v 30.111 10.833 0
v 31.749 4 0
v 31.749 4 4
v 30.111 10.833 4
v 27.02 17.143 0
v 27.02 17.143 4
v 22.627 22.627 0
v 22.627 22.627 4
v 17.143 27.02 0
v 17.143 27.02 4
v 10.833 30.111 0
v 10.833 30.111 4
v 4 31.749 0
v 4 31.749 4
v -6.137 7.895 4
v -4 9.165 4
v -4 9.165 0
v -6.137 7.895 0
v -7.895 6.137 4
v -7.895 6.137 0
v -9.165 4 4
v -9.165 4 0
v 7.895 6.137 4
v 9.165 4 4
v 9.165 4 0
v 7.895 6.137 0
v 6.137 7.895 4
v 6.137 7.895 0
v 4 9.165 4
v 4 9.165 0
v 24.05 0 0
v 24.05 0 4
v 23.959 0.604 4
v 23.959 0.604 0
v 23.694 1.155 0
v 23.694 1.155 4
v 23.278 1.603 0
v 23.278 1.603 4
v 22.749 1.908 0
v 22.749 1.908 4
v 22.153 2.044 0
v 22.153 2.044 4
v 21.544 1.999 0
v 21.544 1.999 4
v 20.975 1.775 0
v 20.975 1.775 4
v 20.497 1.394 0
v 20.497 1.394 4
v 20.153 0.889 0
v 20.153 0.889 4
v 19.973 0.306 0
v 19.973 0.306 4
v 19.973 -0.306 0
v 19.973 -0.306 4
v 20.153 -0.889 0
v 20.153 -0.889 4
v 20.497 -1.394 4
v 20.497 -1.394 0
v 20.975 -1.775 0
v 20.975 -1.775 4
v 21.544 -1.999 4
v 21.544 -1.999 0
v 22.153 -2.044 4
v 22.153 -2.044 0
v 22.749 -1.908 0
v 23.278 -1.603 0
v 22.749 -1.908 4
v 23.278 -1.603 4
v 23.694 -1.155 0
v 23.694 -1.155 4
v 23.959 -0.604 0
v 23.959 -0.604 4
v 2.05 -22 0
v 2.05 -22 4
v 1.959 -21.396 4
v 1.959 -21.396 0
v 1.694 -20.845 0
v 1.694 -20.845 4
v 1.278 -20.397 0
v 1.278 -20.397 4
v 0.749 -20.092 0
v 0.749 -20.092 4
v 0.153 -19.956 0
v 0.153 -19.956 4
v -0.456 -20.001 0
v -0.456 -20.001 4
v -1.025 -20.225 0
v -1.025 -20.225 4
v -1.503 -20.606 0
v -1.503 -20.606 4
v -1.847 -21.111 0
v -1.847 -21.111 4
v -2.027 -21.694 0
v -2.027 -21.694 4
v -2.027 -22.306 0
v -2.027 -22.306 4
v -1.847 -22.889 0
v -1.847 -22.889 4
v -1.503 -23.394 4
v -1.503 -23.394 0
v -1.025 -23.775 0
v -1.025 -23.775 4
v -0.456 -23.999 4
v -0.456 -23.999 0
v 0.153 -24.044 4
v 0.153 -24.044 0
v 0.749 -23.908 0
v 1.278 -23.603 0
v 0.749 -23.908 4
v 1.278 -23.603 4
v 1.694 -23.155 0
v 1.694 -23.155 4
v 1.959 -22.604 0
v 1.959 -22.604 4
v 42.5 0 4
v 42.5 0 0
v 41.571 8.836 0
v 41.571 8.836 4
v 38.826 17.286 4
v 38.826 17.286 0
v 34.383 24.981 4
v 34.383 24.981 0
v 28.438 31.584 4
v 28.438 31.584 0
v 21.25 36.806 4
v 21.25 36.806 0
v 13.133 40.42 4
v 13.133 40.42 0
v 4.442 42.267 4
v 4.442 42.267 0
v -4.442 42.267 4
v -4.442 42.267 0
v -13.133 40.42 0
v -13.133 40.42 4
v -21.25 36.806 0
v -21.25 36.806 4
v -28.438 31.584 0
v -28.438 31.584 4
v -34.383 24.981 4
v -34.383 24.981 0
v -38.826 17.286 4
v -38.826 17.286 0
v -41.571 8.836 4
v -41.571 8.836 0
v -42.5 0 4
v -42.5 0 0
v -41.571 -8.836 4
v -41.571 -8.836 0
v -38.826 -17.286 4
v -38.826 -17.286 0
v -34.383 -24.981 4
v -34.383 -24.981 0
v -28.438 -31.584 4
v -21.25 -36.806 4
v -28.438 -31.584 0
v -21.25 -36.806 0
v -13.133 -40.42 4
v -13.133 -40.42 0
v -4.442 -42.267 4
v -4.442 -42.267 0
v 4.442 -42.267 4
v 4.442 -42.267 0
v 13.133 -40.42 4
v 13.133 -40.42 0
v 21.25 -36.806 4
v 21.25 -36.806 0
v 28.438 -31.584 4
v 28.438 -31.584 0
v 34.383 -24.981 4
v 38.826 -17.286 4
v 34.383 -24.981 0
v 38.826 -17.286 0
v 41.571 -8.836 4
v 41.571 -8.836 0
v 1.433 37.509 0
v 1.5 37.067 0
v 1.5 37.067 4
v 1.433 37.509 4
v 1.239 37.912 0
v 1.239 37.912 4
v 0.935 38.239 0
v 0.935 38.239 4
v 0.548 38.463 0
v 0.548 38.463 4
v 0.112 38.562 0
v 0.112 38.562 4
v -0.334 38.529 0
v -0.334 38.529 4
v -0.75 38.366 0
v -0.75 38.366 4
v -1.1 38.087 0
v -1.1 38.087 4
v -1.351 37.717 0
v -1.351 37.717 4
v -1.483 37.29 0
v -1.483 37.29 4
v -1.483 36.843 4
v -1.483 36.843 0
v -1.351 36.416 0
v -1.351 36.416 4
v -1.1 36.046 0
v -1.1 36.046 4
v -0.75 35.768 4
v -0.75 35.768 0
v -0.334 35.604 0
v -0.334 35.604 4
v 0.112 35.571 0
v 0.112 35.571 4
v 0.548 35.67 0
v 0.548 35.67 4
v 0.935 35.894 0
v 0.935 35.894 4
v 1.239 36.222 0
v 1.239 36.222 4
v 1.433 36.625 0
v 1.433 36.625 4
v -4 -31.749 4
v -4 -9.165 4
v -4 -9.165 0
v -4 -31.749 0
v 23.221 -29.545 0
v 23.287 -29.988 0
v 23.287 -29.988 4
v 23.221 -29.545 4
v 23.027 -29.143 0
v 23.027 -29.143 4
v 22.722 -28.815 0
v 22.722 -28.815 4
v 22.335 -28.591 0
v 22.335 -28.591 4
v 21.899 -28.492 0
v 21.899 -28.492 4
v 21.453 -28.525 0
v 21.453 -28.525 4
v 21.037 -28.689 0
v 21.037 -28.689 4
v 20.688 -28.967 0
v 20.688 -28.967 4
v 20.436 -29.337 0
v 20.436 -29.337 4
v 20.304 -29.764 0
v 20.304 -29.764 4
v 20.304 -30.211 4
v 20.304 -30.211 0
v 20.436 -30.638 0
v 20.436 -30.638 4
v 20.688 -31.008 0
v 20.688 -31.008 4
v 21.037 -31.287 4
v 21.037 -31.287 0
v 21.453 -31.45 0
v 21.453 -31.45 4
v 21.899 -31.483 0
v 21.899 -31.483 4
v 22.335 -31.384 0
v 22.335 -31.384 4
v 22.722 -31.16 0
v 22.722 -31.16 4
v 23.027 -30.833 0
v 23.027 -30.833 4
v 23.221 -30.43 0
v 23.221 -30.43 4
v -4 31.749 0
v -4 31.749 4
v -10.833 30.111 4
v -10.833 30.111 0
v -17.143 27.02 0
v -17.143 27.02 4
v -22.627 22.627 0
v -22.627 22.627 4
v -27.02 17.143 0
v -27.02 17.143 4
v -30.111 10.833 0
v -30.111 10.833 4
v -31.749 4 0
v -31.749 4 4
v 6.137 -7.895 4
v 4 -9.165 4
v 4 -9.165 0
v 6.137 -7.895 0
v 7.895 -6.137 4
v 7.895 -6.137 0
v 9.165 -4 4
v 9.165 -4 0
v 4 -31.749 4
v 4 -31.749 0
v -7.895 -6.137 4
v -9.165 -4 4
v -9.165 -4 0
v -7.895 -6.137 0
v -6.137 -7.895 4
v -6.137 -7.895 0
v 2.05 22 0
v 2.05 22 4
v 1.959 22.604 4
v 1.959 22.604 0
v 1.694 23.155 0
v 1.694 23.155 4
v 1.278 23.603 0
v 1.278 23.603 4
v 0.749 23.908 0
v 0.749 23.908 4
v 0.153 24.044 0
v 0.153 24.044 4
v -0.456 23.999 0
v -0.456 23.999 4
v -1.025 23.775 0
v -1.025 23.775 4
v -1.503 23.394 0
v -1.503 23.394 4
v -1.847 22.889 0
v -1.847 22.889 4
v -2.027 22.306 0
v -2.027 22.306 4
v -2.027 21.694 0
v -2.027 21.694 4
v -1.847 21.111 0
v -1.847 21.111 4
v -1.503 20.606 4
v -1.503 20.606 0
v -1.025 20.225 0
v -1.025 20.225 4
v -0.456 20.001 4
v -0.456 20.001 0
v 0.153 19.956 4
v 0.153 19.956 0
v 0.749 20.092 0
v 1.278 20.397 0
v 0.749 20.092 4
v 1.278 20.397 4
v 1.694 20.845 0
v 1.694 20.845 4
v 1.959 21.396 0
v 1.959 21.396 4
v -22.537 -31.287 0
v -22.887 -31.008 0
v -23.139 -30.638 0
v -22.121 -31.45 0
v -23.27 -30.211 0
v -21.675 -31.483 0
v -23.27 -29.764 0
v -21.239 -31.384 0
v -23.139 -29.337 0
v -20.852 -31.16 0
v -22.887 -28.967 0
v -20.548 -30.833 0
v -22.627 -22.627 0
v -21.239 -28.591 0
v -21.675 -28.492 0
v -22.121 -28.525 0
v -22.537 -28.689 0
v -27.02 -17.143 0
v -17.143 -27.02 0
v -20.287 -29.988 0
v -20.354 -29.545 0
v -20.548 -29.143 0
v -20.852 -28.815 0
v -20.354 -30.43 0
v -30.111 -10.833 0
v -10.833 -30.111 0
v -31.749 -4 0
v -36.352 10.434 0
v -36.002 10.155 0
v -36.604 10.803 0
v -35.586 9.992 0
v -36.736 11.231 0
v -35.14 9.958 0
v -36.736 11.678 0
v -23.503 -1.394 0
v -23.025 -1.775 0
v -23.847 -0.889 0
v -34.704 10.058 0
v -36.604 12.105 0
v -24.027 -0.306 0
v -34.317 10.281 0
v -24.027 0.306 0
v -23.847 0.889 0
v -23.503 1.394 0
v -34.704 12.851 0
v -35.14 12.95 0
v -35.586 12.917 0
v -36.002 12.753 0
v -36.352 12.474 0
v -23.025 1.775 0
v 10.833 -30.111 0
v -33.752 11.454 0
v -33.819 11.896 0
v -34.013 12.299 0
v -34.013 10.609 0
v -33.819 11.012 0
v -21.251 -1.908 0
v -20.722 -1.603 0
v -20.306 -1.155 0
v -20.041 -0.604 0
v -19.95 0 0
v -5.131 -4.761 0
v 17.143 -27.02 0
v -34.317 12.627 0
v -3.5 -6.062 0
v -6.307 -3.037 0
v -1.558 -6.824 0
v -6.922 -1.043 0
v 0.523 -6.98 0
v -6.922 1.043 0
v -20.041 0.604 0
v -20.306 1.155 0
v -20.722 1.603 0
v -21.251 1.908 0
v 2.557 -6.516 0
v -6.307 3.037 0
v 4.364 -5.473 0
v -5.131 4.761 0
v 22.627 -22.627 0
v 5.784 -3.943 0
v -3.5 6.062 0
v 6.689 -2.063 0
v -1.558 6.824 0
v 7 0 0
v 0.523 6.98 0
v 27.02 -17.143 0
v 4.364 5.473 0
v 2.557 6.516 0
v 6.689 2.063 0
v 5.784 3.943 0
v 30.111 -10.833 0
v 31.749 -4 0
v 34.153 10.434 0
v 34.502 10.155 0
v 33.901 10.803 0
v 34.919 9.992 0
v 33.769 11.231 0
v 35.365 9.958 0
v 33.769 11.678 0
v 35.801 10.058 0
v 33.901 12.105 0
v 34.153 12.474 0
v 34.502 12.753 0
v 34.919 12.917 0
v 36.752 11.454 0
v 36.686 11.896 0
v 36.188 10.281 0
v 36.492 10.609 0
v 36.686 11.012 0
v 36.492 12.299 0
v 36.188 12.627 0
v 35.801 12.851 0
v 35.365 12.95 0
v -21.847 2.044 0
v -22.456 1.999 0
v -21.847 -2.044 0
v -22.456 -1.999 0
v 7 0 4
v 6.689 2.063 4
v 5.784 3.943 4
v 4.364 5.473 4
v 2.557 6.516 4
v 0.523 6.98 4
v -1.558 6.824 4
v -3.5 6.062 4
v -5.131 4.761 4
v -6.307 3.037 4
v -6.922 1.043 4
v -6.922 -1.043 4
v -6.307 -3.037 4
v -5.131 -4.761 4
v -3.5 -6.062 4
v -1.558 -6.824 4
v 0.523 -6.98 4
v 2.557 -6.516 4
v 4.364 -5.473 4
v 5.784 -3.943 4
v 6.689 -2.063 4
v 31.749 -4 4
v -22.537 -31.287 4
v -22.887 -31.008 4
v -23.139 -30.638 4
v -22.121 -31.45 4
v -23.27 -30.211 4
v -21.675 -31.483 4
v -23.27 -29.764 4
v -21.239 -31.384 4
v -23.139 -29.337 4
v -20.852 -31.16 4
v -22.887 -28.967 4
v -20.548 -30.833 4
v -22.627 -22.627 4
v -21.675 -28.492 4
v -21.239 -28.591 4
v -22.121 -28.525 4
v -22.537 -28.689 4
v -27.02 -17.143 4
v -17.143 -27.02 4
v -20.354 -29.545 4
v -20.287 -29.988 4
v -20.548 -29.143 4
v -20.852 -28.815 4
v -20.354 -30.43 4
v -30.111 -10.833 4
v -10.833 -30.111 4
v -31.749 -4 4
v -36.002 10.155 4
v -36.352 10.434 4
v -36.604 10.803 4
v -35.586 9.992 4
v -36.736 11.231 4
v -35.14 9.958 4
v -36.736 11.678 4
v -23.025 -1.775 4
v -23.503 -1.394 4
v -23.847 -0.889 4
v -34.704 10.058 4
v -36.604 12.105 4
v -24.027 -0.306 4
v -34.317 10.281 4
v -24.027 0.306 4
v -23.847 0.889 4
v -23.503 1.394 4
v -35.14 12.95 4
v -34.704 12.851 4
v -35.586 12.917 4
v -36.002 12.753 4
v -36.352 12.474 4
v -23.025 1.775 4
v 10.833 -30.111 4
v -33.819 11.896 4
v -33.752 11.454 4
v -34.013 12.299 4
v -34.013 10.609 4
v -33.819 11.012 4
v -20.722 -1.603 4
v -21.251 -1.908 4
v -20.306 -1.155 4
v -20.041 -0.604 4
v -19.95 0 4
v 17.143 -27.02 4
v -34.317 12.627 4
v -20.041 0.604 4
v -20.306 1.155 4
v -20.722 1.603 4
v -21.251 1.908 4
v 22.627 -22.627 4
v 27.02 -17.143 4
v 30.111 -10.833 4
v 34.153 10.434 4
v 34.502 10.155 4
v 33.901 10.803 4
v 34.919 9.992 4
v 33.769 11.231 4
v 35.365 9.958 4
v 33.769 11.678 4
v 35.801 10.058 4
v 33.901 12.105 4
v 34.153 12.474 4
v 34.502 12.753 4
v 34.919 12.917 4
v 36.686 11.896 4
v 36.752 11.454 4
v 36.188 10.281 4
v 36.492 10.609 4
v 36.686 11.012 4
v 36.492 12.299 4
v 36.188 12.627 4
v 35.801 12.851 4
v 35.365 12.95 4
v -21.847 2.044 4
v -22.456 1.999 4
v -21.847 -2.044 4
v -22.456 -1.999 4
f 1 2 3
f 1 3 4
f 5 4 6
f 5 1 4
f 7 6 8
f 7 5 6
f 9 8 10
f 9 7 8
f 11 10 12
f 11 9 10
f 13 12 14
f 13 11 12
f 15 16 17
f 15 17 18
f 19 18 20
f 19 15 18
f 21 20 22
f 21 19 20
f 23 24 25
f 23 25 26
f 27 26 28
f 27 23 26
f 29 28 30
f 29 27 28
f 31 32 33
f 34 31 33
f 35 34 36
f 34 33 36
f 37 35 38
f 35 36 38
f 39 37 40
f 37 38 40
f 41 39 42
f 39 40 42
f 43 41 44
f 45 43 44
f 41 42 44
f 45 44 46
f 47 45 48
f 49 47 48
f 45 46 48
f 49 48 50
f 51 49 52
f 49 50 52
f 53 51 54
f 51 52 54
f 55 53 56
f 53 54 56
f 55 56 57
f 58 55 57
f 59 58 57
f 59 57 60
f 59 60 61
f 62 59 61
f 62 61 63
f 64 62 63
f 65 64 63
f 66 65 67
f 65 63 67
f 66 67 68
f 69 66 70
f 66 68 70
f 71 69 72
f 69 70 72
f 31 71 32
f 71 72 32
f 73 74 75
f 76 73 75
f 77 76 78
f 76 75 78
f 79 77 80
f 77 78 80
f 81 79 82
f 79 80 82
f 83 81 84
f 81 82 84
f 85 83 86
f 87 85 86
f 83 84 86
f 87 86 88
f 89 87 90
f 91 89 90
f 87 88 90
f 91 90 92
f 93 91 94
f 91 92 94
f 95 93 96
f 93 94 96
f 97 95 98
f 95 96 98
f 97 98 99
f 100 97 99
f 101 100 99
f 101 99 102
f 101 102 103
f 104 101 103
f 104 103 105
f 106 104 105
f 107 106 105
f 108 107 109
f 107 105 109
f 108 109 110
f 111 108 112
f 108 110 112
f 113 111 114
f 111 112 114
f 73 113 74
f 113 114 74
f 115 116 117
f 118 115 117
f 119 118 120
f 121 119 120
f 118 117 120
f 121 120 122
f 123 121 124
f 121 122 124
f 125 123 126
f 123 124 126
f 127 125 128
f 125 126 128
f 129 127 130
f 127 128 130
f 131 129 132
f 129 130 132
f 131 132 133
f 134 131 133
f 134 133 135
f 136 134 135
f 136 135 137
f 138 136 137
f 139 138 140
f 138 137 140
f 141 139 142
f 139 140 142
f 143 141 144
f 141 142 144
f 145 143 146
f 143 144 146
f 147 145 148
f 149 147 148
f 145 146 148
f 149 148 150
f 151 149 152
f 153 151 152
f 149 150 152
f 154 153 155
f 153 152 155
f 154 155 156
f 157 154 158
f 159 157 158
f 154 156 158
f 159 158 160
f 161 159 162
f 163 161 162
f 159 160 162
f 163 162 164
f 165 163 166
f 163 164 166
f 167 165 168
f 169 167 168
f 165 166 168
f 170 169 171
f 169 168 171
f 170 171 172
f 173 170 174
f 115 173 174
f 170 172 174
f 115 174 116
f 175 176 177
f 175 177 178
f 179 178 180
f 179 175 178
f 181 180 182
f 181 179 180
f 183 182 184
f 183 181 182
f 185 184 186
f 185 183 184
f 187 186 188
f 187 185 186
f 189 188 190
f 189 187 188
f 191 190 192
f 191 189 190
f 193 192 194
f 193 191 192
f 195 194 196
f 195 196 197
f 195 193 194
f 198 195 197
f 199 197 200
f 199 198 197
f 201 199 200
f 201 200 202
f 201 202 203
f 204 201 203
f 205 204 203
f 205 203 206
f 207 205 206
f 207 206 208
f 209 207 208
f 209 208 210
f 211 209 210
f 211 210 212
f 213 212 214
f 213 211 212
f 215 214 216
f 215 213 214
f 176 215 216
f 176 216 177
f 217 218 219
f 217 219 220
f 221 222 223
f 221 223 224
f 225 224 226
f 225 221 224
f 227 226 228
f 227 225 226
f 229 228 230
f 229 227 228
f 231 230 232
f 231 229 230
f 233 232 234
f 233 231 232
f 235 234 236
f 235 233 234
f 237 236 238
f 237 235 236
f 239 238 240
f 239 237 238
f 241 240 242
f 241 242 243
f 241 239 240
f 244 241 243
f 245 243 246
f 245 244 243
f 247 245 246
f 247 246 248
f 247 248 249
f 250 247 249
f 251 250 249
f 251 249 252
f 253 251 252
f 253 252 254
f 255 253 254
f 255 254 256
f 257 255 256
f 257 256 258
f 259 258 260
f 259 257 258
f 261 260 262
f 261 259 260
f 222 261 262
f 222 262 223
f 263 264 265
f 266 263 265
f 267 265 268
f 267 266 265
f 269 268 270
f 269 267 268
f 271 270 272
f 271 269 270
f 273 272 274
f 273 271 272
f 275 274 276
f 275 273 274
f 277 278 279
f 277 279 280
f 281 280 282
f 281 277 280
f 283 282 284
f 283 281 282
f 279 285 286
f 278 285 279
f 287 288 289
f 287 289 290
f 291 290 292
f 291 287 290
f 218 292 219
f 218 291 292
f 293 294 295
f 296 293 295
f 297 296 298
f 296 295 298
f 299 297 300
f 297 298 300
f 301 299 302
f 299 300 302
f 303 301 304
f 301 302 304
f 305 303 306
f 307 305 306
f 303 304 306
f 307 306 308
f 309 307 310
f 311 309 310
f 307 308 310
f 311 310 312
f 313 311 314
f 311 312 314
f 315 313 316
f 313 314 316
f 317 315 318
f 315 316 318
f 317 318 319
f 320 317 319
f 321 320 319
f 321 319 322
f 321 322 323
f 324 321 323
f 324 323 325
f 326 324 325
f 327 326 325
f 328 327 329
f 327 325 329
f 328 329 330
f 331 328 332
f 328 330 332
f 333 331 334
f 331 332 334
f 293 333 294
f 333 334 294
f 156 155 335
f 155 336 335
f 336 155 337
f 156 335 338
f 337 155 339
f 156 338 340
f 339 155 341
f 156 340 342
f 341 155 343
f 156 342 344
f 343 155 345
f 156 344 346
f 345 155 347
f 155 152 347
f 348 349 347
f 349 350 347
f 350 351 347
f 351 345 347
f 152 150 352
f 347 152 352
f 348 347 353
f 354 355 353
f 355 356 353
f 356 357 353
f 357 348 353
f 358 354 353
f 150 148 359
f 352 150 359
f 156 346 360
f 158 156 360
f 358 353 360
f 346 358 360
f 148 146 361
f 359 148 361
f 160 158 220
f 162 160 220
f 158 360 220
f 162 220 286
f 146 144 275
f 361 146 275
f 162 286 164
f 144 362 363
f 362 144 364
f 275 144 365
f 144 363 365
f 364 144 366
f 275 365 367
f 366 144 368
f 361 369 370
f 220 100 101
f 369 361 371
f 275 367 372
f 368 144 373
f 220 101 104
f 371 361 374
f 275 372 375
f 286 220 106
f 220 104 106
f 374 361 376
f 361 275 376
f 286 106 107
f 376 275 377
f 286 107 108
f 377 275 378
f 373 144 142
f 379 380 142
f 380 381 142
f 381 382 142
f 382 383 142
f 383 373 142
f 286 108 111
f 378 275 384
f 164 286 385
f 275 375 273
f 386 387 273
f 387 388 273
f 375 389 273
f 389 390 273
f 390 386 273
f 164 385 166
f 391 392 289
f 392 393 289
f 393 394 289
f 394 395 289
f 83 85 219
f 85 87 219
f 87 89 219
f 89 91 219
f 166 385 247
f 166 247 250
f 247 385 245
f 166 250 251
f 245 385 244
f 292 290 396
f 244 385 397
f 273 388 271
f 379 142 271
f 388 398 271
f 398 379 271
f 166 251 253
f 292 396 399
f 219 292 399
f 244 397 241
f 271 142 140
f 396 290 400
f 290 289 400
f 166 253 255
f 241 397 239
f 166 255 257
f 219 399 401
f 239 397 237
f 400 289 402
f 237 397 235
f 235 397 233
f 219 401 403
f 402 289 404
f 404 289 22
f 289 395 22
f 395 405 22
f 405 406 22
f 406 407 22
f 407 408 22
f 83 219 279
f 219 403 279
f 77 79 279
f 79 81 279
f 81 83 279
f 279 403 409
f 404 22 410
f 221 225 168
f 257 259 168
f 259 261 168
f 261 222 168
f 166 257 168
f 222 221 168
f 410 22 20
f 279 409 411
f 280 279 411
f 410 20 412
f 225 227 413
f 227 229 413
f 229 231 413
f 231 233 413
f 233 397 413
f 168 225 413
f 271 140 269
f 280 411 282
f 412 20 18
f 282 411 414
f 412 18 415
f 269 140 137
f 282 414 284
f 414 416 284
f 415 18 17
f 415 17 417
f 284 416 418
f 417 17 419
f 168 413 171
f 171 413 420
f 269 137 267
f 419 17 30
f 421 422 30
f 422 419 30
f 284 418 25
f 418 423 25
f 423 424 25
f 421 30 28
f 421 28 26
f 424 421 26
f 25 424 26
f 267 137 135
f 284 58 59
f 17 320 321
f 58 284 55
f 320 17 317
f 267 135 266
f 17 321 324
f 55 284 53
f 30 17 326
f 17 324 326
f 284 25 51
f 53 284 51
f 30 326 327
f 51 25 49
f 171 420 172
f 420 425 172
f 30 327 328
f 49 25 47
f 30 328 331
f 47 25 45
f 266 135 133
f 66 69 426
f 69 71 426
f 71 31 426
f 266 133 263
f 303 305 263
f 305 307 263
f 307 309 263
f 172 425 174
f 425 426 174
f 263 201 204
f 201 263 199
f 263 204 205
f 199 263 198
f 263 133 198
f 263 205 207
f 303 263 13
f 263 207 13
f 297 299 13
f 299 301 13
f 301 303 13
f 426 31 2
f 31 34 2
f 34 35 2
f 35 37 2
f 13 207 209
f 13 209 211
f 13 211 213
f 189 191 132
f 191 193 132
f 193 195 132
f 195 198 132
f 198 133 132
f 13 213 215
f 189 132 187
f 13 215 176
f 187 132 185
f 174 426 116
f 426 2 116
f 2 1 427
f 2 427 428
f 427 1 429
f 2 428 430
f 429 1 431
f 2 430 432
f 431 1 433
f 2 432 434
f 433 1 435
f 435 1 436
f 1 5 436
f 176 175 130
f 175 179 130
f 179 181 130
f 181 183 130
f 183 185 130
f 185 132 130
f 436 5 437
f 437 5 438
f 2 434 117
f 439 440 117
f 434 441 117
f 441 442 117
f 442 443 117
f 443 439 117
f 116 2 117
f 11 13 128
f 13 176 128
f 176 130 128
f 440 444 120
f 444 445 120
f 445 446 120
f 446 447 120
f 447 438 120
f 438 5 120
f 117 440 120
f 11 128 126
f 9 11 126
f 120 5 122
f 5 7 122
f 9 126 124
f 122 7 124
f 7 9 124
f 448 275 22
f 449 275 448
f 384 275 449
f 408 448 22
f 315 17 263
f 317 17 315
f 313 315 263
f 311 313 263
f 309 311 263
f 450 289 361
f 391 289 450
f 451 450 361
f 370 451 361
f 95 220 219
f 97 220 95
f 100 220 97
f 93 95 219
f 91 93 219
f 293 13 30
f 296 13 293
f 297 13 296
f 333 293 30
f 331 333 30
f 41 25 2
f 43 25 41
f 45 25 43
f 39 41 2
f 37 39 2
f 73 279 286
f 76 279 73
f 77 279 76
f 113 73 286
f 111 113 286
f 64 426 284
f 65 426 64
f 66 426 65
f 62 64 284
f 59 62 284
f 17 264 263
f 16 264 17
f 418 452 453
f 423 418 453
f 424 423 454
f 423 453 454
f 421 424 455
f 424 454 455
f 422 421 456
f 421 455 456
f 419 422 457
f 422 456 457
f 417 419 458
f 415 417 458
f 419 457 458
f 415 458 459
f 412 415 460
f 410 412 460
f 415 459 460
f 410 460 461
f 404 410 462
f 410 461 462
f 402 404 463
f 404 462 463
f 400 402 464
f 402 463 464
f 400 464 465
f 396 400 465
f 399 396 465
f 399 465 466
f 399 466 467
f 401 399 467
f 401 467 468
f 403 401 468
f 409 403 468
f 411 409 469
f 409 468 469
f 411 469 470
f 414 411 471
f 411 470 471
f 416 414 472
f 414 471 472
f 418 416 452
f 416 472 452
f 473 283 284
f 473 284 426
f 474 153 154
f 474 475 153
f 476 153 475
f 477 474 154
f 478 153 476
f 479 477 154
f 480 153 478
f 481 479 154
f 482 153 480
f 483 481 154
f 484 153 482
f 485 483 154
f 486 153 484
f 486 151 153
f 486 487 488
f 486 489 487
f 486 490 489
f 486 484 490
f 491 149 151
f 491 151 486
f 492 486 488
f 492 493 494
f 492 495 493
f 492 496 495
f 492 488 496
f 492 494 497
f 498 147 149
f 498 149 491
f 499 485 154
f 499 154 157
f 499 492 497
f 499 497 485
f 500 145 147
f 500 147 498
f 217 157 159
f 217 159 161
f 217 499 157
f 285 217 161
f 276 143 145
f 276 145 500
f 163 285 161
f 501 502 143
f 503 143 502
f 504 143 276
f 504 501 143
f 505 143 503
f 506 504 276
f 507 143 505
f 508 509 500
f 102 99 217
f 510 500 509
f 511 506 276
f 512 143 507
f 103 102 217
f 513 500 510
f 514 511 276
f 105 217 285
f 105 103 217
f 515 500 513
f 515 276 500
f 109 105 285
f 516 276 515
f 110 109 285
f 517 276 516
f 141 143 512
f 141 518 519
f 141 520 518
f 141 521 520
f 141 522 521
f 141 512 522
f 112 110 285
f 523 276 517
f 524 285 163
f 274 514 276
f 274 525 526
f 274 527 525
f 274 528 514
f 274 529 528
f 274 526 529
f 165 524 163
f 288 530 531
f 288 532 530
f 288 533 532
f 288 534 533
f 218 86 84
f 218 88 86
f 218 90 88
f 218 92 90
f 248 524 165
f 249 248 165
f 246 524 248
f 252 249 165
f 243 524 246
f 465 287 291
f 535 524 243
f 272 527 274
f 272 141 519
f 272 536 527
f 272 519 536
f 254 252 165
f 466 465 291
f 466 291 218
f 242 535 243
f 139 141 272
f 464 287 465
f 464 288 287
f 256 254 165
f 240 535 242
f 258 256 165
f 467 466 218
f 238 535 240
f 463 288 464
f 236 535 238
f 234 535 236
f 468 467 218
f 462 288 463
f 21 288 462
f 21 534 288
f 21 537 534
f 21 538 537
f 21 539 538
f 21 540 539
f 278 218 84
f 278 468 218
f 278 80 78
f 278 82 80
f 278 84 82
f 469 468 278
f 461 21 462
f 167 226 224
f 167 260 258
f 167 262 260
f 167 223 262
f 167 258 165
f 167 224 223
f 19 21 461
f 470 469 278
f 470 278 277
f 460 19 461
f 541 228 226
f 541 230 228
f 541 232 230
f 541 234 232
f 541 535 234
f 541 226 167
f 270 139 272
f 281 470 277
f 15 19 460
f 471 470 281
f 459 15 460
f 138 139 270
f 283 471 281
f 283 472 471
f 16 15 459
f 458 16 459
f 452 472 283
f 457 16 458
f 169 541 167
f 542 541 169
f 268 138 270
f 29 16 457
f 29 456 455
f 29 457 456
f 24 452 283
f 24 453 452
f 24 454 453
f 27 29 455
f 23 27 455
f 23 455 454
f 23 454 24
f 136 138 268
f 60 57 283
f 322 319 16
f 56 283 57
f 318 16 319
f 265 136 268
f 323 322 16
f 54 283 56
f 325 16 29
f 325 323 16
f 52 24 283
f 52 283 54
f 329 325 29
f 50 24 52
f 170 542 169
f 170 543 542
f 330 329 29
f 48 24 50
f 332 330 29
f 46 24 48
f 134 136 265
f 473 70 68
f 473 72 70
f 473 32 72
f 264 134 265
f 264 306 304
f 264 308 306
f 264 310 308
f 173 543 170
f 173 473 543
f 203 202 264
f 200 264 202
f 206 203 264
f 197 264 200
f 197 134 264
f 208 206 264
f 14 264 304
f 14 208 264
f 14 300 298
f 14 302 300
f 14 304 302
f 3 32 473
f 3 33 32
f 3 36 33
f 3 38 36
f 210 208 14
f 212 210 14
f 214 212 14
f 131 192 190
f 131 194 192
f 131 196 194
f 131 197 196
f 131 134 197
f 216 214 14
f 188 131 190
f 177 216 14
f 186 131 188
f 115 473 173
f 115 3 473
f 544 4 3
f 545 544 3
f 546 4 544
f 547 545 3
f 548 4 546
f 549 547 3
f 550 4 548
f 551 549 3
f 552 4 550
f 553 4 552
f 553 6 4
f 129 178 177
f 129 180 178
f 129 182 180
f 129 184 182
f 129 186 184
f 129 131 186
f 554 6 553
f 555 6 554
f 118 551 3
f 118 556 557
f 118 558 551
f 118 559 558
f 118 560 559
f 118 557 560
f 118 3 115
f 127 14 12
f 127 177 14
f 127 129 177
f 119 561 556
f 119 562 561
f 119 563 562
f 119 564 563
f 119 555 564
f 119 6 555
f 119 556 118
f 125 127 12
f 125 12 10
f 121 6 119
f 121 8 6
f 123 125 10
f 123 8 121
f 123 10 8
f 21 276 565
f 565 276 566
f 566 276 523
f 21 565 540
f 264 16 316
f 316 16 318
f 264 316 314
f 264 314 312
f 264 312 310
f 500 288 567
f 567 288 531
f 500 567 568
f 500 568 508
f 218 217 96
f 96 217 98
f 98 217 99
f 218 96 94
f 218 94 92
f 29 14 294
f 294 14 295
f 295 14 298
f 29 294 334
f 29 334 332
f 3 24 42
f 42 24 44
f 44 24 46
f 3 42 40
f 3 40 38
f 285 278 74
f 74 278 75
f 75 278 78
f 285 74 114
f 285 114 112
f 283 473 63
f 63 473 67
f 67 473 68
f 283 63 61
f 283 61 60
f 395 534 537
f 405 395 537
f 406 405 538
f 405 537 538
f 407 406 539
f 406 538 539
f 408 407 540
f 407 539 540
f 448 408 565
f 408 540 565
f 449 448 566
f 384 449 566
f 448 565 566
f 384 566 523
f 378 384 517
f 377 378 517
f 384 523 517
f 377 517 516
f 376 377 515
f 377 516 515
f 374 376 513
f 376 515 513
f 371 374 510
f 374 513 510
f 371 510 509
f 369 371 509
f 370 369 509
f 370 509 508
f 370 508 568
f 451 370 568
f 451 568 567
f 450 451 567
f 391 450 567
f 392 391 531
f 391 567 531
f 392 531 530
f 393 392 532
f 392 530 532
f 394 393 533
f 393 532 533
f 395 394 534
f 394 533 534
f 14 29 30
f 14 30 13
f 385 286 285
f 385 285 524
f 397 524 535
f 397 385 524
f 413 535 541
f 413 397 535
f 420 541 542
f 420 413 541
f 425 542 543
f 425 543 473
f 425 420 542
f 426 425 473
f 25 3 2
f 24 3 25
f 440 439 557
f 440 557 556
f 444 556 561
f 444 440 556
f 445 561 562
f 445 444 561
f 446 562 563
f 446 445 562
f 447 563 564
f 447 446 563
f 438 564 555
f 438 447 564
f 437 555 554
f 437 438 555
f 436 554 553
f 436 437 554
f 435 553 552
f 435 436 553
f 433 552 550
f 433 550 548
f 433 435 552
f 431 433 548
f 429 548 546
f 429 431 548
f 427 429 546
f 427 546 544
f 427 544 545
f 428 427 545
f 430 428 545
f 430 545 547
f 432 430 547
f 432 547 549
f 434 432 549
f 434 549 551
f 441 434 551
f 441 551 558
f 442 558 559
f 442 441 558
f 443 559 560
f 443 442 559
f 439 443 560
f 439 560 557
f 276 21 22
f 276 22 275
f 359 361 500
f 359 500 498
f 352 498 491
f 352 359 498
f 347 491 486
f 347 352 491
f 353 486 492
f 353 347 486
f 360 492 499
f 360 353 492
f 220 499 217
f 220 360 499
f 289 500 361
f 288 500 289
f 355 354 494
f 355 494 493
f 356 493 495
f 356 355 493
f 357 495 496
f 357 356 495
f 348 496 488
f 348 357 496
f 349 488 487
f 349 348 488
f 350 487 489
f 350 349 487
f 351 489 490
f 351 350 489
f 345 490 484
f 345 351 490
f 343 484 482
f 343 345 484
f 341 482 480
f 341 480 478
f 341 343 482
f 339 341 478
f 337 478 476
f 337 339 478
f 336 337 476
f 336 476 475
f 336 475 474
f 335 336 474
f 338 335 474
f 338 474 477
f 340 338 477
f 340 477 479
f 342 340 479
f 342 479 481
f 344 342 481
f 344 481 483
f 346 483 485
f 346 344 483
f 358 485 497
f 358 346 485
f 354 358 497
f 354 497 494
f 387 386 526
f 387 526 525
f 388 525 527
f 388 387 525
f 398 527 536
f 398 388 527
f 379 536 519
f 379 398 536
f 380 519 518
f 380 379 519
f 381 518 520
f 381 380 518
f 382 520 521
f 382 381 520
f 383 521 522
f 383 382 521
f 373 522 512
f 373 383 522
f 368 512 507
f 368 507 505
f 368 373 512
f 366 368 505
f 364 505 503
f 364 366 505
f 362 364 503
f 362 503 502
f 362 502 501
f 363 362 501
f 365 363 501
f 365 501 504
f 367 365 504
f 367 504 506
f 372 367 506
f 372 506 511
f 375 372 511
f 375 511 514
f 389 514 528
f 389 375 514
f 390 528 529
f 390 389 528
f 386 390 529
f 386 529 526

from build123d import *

# Parameters (mm, degrees)
SKETCH1_R           = 42.5
SKETCH1_R_2         = 32
SKETCH1_R_3         = 1.5
BOSS_EXTRUDE1_DEPTH = 4
SKETCH2_R           = 2.05
SKETCH2_R_2         = 7
BOSS_EXTRUDE2_DEPTH = 4


with BuildPart() as part:
    # Sketch1 → Boss-Extrude1 (new body)
    with BuildSketch(Plane.XY):
        Circle(SKETCH1_R)
        Circle(SKETCH1_R_2, mode=Mode.SUBTRACT)
        with Locations((0, 37.066662977)):
            Circle(SKETCH1_R_3, mode=Mode.SUBTRACT)
        with Locations((35.252491362, 11.454228785)):
            Circle(SKETCH1_R_3, mode=Mode.SUBTRACT)
        with Locations((21.78723785, -29.987560273)):
            Circle(SKETCH1_R_3, mode=Mode.SUBTRACT)
        with Locations((-21.78723785, -29.987560273)):
            Circle(SKETCH1_R_3, mode=Mode.SUBTRACT)
        with Locations((-35.252491362, 11.454228785)):
            Circle(SKETCH1_R_3, mode=Mode.SUBTRACT)
    extrude(amount=BOSS_EXTRUDE1_DEPTH)

    # Sketch2 → Boss-Extrude2 (add, through all)
    with BuildSketch(Plane.XY.offset(4)):
        with BuildLine():
            Line((-9.16515139, 4), (-31.749015733, 4))
            ThreePointArc((-31.749015733, 4), (-32, 0), (-31.749015733, -4))
            Line((-31.749015733, -4), (-9.16515139, -4))
            ThreePointArc((-9.16515139, -4), (-7.071067812, -7.071067812), (-4, -9.16515139))
            Line((-4, -9.16515139), (-4, -31.749015733))
            ThreePointArc((-4, -31.749015733), (0, -32), (4, -31.749015733))
            Line((4, -31.749015733), (4, -9.16515139))
            ThreePointArc((4, -9.16515139), (7.071067812, -7.071067812), (9.16515139, -4))
            Line((9.16515139, -4), (31.749015733, -4))
            ThreePointArc((31.749015733, -4), (32, 0), (31.749015733, 4))
            Line((31.749015733, 4), (9.16515139, 4))
            ThreePointArc((9.16515139, 4), (7.071067812, 7.071067812), (4, 9.16515139))
            Line((4, 9.16515139), (4, 31.749015733))
            ThreePointArc((4, 31.749015733), (0, 32), (-4, 31.749015733))
            Line((-4, 31.749015733), (-4, 9.16515139))
            ThreePointArc((-4, 9.16515139), (-7.071067812, 7.071067812), (-9.16515139, 4))
        make_face()
        with Locations((0, 22)):
            Circle(SKETCH2_R, mode=Mode.SUBTRACT)
        with Locations((22, 0)):
            Circle(SKETCH2_R, mode=Mode.SUBTRACT)
        with Locations((0, -22)):
            Circle(SKETCH2_R, mode=Mode.SUBTRACT)
        with Locations((-22, 0)):
            Circle(SKETCH2_R, mode=Mode.SUBTRACT)
        Circle(SKETCH2_R_2, mode=Mode.SUBTRACT)
    extrude(amount=-BOSS_EXTRUDE2_DEPTH)


solid = part.part
